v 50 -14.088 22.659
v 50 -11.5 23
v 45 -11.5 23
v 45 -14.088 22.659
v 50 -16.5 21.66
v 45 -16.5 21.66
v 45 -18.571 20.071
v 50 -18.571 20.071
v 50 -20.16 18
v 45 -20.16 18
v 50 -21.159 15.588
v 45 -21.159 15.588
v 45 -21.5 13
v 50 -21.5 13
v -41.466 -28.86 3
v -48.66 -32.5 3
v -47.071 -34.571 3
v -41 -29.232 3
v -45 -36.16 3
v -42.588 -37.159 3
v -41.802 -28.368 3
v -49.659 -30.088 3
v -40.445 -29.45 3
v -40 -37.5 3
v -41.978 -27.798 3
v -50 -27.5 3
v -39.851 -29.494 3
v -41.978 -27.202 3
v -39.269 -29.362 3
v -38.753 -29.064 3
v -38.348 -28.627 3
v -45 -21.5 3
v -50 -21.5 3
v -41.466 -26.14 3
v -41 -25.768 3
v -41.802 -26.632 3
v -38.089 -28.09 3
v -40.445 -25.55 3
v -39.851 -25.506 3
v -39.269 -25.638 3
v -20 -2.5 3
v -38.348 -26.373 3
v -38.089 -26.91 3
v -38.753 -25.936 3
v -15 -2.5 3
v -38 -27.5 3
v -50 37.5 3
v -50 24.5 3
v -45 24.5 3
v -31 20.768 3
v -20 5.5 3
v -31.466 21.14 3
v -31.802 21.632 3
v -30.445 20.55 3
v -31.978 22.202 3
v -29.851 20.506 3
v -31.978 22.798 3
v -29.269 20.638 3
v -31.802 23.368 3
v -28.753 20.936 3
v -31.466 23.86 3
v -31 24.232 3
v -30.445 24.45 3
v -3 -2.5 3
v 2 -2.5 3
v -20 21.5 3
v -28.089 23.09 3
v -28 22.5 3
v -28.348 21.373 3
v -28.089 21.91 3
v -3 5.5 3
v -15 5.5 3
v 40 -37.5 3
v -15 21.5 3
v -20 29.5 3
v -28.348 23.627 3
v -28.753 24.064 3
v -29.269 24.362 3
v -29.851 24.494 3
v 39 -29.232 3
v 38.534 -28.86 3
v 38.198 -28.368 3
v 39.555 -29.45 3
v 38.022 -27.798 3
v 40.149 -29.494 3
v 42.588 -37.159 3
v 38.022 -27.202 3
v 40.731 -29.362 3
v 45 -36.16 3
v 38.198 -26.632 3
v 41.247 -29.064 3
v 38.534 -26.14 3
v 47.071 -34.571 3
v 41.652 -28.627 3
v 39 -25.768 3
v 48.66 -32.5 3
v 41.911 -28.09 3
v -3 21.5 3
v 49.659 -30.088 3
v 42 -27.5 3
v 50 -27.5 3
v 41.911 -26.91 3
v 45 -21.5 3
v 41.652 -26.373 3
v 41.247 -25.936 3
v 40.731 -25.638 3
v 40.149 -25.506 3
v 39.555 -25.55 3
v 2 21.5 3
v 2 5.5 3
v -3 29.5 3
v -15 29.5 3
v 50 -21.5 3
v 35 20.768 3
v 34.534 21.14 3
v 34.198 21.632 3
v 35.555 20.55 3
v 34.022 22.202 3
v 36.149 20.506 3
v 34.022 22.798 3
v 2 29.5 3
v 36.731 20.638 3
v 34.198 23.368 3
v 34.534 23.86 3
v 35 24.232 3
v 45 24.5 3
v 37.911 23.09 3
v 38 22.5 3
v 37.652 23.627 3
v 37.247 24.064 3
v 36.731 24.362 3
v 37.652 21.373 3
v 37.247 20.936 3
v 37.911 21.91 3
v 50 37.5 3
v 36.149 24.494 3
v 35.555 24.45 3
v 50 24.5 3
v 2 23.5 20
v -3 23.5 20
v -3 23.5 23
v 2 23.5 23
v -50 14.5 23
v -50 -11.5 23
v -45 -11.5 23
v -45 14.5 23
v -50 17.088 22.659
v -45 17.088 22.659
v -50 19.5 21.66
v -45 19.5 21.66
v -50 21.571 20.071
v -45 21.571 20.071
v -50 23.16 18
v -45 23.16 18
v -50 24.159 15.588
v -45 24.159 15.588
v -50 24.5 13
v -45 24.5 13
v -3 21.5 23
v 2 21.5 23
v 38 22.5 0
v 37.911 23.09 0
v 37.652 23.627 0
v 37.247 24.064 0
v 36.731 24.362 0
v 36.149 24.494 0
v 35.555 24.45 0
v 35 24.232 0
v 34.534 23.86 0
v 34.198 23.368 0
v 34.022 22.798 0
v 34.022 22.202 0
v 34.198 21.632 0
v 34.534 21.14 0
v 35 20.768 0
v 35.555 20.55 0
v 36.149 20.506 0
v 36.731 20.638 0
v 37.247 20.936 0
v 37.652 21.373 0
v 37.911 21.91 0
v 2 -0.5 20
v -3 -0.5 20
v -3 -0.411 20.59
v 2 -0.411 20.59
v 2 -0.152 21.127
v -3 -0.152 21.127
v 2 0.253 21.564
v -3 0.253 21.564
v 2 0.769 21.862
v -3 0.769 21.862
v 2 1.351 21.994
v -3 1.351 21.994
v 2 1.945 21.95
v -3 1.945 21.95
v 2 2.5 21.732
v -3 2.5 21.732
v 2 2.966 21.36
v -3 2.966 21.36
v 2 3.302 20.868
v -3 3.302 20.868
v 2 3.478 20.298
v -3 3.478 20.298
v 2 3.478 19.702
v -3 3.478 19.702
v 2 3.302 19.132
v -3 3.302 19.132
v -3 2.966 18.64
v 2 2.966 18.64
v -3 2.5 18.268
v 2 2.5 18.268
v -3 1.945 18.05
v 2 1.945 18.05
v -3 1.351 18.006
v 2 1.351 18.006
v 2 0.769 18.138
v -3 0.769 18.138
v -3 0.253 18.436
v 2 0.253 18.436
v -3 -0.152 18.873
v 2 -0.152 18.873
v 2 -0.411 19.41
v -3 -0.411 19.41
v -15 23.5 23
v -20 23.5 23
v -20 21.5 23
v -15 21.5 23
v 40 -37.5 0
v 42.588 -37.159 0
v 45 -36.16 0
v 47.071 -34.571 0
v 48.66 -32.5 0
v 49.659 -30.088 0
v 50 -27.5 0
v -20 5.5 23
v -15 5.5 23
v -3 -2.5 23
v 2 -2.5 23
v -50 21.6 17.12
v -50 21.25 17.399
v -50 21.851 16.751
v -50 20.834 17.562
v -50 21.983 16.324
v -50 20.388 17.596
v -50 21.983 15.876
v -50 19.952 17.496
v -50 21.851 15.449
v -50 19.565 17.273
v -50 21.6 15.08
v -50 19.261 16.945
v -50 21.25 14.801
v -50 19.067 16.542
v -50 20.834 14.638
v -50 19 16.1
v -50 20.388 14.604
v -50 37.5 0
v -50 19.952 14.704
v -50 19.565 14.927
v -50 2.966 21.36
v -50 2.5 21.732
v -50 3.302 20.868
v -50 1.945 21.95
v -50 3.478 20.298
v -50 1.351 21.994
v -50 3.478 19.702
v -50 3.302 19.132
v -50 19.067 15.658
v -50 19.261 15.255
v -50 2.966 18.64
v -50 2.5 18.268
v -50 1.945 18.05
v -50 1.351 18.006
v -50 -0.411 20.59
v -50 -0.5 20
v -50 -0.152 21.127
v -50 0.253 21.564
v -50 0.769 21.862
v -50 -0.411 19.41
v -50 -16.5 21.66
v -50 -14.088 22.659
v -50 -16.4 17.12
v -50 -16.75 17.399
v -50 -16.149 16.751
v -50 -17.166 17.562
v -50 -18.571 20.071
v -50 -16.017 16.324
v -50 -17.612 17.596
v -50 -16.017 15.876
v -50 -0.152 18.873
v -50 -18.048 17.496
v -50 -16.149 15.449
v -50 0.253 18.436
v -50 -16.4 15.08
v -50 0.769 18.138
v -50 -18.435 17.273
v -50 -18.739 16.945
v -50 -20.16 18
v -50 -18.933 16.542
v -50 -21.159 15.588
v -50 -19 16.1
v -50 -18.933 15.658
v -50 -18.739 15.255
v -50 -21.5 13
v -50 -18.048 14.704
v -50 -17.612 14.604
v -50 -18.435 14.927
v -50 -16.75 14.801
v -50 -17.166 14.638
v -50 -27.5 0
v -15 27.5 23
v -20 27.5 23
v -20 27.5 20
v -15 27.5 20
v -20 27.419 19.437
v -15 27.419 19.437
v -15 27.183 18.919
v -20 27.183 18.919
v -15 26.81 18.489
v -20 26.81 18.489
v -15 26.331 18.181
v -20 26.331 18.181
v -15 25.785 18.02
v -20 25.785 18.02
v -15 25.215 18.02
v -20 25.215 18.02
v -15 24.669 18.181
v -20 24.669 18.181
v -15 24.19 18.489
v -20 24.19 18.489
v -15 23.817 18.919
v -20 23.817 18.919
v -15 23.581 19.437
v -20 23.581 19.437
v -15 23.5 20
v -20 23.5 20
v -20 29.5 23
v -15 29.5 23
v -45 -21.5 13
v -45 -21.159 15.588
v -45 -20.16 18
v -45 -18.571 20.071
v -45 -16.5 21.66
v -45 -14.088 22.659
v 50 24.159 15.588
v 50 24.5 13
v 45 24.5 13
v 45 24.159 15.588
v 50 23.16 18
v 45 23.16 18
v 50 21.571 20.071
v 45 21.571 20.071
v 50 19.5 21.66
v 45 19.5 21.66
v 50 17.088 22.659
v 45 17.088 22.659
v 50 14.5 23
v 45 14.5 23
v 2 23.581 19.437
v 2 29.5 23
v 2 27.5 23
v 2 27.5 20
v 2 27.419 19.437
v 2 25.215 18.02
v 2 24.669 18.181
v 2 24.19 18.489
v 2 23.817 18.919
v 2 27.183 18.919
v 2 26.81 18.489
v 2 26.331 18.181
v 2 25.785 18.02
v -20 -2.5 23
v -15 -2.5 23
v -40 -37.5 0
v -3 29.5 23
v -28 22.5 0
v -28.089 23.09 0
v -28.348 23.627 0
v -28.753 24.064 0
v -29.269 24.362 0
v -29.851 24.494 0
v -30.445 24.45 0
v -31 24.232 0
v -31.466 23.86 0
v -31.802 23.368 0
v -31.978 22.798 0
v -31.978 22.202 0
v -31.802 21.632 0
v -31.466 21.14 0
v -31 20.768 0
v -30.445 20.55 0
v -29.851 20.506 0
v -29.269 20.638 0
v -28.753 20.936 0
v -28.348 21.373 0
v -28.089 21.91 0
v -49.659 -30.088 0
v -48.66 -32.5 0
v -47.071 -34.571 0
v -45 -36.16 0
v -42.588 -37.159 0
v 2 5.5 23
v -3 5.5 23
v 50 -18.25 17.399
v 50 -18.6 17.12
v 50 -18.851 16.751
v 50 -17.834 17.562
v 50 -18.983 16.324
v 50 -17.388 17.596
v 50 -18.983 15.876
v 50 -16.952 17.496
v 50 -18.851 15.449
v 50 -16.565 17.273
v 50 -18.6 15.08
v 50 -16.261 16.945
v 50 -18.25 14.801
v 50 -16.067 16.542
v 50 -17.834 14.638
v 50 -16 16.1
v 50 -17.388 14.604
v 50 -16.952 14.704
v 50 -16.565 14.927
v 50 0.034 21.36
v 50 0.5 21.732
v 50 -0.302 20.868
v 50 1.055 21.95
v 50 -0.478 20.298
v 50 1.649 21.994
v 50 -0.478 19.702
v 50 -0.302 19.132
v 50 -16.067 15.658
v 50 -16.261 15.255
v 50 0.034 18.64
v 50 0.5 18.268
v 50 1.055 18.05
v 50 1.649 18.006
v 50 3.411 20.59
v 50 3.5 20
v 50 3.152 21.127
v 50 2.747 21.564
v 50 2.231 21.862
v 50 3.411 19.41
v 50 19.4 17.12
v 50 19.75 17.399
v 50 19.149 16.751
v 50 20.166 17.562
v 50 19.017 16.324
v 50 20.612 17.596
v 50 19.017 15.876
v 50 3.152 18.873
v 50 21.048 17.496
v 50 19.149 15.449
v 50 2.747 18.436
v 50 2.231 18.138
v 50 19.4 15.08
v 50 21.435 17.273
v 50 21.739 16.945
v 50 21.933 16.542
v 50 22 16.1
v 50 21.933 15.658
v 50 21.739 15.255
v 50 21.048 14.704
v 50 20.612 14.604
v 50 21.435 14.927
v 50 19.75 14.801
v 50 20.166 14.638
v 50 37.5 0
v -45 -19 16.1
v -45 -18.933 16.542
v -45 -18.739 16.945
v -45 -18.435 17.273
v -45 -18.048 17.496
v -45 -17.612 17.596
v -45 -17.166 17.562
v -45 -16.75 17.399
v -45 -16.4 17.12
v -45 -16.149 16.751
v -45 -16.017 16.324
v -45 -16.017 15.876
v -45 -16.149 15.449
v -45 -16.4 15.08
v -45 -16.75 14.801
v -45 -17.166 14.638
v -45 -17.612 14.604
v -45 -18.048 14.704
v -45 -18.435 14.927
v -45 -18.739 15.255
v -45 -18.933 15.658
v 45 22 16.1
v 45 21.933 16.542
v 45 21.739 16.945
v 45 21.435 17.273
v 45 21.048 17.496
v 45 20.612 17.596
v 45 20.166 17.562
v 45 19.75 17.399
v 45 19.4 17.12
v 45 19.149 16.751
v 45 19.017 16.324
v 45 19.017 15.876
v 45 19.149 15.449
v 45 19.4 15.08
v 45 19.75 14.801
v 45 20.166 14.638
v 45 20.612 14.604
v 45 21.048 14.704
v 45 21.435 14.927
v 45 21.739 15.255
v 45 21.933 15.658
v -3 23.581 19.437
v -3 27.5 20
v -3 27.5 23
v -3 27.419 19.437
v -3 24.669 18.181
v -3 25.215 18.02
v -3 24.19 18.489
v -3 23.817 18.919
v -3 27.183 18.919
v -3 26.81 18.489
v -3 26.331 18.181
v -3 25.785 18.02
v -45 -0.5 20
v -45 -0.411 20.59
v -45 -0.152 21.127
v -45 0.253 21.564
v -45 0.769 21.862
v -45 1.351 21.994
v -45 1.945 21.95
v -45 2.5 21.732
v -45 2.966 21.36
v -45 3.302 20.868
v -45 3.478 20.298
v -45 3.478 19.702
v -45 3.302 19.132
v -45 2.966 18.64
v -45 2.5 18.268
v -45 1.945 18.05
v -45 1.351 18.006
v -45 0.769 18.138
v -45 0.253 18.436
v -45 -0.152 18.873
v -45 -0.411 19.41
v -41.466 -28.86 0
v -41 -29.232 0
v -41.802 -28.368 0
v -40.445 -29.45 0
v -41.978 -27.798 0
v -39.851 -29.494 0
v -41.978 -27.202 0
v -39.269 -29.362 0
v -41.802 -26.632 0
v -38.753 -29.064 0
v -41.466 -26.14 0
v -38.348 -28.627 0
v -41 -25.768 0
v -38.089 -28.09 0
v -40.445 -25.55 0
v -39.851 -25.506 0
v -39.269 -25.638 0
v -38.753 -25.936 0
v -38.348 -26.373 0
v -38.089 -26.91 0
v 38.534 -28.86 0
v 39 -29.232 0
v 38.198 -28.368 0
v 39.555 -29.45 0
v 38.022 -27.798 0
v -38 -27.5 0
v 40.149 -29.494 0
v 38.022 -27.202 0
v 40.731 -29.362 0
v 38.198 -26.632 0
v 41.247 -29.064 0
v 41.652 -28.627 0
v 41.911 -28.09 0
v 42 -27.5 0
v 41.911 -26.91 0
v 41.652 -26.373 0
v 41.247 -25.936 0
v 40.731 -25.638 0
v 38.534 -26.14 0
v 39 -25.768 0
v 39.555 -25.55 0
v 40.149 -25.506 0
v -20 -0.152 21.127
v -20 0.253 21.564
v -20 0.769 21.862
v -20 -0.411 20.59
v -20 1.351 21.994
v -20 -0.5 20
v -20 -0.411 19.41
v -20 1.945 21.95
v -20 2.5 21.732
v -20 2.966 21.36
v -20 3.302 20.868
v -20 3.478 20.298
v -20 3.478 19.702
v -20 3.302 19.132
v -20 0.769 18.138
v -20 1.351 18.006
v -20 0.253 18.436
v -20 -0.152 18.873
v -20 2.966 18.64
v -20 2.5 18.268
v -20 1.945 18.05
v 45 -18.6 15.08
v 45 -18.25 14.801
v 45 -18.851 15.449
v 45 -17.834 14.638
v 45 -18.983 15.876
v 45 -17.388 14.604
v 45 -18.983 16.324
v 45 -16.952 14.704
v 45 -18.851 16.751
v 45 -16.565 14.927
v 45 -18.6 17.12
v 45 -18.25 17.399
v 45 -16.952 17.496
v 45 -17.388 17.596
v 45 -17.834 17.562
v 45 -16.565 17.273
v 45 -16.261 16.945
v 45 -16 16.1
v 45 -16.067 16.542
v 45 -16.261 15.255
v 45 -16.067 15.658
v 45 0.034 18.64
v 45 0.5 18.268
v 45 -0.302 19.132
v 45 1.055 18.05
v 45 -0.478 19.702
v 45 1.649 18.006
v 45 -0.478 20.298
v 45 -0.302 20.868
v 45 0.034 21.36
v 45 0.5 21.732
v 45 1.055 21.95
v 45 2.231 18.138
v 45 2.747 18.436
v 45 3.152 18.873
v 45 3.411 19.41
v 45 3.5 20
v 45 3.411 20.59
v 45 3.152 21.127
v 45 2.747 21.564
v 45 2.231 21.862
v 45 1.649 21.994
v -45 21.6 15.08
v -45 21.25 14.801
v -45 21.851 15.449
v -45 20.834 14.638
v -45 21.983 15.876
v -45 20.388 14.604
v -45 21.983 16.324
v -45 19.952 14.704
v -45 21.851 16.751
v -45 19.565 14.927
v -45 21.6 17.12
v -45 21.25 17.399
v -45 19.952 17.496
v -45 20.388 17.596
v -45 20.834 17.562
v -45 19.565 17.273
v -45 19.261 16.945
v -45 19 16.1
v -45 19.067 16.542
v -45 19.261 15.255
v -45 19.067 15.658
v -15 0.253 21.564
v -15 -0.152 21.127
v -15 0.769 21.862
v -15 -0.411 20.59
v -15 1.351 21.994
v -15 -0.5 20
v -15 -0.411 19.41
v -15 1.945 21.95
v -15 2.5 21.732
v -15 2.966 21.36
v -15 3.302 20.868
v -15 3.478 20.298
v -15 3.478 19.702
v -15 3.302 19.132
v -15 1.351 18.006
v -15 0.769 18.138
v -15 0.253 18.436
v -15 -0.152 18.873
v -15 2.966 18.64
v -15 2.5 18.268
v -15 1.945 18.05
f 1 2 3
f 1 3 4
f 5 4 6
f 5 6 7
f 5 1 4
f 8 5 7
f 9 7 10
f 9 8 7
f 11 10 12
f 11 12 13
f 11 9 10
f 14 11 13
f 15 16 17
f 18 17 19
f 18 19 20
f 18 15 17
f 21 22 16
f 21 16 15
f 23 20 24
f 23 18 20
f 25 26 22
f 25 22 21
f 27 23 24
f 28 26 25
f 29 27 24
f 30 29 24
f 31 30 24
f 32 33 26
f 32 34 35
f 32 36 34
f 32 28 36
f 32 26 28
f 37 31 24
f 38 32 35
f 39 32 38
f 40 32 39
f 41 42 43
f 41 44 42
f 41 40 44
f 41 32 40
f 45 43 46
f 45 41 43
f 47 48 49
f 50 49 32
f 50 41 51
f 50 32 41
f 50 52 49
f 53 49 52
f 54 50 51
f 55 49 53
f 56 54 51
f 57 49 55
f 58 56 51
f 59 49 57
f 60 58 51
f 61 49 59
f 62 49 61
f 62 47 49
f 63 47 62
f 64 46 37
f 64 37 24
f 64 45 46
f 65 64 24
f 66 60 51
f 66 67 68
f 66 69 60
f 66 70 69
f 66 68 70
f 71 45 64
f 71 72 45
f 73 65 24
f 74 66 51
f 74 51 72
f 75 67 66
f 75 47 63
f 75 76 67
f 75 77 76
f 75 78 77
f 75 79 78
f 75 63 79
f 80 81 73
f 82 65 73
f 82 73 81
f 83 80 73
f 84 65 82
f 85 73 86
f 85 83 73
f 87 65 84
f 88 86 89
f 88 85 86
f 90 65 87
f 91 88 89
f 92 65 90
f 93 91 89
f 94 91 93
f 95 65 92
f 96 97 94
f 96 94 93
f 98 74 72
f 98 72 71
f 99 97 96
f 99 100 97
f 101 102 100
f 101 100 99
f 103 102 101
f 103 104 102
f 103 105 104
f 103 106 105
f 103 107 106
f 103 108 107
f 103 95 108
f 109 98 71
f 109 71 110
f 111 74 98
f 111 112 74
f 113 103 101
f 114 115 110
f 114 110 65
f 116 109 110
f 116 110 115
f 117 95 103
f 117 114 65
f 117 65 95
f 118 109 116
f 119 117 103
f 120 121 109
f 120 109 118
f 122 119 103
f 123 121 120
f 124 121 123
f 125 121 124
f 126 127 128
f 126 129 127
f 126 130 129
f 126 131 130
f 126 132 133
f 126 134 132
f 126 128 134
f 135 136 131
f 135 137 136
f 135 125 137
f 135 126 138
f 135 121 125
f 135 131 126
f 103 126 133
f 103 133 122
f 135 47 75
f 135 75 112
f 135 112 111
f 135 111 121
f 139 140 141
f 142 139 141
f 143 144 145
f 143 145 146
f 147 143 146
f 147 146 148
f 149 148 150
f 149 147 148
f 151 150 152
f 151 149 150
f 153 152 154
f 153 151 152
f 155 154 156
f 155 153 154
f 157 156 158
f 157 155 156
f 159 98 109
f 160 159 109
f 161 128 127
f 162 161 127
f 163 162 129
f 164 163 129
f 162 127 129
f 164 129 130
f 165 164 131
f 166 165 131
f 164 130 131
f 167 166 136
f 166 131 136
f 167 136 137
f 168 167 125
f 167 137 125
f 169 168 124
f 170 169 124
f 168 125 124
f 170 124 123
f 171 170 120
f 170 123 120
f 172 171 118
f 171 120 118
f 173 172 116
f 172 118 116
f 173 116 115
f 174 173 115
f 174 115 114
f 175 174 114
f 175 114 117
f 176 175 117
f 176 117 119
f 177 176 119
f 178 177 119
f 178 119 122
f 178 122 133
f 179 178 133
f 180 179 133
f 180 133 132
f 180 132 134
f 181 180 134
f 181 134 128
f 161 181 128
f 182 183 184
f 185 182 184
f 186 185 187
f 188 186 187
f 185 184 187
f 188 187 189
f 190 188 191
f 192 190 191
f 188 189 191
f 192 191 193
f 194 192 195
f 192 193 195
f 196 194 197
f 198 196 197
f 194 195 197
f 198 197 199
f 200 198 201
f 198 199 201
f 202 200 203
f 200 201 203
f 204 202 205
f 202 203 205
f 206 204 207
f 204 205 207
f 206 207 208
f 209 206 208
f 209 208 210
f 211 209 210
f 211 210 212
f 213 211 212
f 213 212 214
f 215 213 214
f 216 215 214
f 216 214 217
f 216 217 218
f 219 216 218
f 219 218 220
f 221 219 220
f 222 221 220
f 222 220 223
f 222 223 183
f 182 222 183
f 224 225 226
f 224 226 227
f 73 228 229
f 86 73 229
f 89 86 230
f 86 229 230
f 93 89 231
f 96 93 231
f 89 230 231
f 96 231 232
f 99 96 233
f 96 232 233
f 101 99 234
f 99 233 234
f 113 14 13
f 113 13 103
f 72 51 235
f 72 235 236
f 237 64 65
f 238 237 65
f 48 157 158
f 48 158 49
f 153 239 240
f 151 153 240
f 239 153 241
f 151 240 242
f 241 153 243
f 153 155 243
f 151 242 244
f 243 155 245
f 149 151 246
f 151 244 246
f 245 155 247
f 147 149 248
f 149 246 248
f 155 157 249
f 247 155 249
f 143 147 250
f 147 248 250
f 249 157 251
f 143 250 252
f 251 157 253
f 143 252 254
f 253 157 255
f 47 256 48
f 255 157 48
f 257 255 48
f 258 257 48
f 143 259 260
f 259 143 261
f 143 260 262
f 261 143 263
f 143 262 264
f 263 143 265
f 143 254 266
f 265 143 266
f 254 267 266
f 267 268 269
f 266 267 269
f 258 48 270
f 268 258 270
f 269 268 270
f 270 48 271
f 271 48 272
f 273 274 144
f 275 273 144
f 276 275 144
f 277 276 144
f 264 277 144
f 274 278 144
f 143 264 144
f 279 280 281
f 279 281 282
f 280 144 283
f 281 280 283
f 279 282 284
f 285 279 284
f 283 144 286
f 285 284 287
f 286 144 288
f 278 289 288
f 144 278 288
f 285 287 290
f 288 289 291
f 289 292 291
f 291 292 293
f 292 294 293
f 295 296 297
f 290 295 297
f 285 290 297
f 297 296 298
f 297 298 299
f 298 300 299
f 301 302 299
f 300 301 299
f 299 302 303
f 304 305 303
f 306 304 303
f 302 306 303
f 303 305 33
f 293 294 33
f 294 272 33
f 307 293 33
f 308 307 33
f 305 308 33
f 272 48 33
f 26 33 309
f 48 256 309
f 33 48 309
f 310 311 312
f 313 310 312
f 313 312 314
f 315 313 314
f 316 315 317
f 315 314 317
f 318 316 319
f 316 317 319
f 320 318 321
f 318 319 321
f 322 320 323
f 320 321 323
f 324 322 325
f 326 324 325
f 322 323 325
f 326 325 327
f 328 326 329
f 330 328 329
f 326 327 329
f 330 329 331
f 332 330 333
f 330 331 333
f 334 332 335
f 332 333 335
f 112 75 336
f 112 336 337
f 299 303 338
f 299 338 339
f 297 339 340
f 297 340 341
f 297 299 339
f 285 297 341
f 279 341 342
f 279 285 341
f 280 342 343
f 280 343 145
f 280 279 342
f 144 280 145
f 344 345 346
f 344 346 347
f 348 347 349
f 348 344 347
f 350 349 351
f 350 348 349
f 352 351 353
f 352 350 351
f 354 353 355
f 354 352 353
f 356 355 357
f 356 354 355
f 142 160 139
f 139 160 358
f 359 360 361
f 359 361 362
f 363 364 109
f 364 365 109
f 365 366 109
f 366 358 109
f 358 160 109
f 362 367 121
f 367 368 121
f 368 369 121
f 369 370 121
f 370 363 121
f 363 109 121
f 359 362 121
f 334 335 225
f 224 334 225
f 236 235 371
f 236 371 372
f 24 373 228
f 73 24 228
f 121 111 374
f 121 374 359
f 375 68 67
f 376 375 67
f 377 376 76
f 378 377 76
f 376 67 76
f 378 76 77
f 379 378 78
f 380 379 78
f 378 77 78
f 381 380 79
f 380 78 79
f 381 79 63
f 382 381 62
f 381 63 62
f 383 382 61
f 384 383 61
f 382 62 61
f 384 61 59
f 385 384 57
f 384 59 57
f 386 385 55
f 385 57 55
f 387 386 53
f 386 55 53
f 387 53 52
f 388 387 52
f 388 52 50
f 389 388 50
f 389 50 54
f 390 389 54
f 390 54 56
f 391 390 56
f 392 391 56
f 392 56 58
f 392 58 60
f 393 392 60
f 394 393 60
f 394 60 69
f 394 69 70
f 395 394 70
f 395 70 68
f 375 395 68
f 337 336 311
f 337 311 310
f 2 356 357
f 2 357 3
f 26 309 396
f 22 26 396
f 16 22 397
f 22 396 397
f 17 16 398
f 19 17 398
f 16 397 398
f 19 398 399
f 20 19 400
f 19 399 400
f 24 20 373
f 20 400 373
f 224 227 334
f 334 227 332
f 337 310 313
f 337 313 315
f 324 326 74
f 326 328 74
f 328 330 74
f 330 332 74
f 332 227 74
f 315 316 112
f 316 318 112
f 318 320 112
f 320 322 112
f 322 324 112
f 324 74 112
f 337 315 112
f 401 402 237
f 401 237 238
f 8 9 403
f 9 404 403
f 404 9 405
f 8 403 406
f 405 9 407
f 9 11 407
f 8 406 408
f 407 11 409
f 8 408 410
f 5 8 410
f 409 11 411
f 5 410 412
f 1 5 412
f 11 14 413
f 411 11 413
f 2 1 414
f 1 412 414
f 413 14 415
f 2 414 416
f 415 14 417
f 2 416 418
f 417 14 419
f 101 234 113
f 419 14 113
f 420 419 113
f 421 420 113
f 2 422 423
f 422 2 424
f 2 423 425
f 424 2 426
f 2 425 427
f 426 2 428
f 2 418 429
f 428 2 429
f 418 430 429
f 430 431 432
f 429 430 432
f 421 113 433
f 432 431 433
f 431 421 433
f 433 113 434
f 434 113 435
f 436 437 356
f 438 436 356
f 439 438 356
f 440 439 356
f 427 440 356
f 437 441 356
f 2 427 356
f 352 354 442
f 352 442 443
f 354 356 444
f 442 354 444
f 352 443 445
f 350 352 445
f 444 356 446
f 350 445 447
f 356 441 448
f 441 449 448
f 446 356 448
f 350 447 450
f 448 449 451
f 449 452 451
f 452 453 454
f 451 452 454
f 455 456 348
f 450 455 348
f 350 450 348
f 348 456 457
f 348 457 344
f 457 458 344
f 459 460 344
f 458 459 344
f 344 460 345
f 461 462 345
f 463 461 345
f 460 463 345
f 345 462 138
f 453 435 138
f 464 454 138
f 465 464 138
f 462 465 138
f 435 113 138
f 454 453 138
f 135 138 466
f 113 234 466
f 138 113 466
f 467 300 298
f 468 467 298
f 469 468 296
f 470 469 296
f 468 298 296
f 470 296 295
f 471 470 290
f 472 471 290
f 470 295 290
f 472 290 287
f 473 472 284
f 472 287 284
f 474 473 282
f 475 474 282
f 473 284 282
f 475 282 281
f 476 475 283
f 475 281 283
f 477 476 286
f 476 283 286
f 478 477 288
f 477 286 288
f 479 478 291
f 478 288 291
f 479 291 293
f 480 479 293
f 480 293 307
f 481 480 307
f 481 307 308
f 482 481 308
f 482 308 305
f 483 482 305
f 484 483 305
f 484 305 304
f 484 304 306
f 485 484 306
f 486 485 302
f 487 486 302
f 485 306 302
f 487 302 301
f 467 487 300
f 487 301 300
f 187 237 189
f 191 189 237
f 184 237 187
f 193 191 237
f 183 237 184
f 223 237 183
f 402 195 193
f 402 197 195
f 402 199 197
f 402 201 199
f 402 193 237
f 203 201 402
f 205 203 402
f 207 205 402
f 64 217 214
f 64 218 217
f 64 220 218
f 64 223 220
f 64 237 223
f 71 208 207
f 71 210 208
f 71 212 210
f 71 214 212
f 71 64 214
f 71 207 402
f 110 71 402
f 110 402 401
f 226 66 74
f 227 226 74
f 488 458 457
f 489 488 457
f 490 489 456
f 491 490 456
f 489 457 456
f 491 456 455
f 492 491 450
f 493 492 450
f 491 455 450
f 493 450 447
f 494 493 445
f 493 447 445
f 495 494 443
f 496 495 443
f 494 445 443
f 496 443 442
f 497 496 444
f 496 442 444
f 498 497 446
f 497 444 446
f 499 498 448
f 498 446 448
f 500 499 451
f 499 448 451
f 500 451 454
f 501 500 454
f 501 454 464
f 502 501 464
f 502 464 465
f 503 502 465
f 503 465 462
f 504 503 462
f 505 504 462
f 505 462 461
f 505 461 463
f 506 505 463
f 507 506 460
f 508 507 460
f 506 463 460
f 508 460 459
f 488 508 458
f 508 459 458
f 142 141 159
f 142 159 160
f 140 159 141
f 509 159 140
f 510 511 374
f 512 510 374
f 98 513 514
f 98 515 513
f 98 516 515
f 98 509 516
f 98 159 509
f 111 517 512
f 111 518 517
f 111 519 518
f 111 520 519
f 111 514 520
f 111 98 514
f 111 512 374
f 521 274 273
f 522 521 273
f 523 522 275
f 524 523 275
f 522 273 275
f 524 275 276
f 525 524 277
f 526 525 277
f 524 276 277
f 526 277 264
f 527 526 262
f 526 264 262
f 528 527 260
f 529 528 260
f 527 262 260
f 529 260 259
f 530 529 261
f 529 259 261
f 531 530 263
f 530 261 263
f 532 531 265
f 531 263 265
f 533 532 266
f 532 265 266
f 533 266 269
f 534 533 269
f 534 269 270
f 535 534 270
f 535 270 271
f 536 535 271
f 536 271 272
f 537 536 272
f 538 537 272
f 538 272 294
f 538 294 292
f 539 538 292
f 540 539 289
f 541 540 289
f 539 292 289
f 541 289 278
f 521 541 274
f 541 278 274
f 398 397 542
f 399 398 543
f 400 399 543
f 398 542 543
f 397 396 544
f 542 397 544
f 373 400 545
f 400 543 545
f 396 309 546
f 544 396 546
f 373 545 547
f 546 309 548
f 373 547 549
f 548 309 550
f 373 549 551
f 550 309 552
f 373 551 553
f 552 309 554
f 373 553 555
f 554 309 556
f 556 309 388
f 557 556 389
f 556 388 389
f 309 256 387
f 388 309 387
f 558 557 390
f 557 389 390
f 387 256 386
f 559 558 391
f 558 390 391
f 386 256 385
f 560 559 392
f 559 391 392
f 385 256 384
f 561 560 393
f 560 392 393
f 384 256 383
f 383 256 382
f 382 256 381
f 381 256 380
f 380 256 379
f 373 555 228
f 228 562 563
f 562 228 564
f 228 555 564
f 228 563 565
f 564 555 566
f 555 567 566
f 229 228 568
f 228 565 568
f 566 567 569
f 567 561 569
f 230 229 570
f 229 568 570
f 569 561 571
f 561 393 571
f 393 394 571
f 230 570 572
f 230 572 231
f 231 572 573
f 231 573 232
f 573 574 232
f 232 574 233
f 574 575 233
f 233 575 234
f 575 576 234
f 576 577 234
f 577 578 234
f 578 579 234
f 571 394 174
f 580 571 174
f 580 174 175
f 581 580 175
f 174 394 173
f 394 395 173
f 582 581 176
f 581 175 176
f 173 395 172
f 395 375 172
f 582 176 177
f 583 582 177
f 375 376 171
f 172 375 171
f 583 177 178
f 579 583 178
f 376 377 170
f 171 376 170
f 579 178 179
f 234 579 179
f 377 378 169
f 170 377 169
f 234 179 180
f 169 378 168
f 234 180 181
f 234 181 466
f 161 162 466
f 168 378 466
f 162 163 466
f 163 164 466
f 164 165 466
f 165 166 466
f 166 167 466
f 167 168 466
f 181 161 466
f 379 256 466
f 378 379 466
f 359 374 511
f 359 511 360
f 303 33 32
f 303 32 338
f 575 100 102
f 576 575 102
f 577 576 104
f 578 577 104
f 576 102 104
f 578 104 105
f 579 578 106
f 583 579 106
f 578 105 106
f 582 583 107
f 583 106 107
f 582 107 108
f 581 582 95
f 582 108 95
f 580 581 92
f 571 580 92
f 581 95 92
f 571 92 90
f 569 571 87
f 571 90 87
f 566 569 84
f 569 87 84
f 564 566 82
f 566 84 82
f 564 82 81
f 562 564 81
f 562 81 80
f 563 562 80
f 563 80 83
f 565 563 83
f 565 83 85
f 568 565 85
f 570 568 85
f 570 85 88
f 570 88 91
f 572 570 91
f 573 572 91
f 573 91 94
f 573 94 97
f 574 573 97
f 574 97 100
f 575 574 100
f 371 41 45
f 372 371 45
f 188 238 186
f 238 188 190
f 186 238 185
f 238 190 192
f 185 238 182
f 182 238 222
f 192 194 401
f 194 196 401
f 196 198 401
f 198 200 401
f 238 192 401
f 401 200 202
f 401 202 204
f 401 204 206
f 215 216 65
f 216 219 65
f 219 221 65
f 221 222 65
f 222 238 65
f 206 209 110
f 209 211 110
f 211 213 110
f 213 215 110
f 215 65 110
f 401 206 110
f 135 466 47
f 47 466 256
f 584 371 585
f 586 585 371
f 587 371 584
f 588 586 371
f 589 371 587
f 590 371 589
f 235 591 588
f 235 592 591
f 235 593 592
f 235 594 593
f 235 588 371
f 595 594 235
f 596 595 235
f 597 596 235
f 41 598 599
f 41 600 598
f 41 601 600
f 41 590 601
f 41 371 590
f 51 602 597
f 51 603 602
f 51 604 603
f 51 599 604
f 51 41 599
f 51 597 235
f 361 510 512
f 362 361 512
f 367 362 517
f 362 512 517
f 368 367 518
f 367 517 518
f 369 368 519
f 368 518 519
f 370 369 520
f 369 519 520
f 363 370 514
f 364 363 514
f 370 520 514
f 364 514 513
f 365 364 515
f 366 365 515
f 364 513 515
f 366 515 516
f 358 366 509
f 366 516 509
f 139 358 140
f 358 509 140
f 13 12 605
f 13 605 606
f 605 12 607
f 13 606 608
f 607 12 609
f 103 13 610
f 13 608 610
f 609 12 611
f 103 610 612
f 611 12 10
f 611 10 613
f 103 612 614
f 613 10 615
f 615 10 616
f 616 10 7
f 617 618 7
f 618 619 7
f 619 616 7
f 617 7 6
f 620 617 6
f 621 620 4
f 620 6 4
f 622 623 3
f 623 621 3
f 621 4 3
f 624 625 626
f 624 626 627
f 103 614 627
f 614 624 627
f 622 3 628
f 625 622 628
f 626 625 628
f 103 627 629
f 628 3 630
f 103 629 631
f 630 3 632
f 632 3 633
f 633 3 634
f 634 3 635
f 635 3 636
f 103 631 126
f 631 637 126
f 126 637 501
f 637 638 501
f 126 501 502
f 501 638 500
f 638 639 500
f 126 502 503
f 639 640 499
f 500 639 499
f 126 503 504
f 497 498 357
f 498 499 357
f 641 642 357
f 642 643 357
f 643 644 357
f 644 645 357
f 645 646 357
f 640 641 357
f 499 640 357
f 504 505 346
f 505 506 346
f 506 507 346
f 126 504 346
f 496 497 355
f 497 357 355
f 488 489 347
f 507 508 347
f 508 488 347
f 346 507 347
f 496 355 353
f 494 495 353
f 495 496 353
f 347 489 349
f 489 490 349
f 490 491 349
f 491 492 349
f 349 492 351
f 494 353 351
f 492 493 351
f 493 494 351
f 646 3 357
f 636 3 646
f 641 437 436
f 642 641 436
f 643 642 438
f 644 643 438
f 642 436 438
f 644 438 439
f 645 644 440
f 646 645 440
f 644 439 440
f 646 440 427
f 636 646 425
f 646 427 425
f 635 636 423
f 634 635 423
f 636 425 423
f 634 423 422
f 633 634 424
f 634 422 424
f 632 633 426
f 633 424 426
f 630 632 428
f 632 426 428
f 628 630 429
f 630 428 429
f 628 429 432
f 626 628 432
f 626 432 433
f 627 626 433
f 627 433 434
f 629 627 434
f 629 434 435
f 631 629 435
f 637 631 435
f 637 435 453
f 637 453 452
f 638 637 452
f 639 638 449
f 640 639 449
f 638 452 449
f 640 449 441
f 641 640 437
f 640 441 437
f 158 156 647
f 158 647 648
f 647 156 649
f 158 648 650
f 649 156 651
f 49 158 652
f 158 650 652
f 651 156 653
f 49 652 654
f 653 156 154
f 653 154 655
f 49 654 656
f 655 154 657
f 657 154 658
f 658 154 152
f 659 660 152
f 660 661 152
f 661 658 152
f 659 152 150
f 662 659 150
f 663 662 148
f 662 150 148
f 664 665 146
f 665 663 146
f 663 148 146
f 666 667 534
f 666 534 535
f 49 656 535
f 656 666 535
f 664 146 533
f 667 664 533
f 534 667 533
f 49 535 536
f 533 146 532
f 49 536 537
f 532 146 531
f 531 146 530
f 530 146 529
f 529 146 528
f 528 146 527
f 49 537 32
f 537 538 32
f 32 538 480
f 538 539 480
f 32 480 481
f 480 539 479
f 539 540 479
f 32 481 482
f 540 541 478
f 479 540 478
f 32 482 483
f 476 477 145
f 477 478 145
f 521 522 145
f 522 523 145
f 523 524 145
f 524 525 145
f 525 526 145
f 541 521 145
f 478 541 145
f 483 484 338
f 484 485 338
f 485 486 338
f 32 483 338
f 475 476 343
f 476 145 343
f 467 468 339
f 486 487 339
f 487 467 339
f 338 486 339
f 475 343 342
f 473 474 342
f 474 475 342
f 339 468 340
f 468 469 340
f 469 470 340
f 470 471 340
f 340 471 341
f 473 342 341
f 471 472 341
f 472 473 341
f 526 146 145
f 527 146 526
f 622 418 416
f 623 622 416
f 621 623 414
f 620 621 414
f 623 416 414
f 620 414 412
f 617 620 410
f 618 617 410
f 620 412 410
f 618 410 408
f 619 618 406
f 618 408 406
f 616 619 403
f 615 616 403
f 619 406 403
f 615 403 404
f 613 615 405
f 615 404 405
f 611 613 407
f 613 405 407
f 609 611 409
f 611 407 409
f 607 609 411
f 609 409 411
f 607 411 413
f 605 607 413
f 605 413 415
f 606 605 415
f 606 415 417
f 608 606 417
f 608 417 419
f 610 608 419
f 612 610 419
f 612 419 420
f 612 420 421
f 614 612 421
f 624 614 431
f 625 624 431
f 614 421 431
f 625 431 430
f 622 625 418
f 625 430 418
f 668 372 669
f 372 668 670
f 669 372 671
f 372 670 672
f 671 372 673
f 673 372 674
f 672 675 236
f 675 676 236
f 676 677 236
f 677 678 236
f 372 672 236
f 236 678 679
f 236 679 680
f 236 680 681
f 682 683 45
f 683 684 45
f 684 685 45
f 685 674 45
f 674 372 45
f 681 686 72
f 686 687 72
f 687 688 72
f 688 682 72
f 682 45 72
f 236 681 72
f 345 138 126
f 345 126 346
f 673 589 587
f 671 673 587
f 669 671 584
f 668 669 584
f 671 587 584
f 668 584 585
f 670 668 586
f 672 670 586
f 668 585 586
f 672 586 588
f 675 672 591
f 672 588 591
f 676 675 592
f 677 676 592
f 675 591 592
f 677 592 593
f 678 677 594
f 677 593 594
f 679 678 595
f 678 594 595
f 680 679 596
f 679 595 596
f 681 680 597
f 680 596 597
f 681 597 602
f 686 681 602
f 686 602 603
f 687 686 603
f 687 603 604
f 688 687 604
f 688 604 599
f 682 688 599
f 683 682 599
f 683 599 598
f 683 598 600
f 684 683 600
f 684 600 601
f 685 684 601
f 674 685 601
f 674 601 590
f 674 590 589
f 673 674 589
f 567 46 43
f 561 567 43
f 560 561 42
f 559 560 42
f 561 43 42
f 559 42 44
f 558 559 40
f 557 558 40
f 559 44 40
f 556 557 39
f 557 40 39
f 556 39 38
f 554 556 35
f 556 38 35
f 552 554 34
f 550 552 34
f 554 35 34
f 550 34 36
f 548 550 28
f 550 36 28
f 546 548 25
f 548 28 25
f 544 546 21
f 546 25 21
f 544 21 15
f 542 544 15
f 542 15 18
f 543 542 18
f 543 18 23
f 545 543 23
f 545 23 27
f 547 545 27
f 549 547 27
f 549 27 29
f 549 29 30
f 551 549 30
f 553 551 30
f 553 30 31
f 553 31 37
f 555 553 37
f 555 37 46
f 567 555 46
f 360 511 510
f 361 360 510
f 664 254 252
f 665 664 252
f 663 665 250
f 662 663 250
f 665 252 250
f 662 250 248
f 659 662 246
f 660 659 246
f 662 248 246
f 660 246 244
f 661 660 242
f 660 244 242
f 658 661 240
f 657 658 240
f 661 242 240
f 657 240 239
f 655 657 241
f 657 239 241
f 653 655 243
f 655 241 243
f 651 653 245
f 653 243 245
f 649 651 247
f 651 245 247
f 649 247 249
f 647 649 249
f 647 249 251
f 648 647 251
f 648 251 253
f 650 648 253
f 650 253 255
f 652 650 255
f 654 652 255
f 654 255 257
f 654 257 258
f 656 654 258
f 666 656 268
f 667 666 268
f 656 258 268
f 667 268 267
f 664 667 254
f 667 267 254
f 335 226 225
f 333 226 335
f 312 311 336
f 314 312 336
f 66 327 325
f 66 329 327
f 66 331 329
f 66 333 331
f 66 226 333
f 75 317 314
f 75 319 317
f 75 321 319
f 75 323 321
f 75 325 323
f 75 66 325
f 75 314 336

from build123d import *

# Parameters (mm, degrees)
F1_DEPTH  = 3
F2_R      = 1.5
F2_R_2    = 2
F3_DEPTH  = 5
F4_R      = 1.5
F4_R_2    = 2
F5_DEPTH  = 5
F6_R      = 2
F7_DEPTH  = 25.4
F8_W      = 5
F8_H      = 8
F9_DEPTH  = 20
F10_R     = 2
F11_DEPTH = 25.4
F13_DEPTH = 25.4


with BuildPart() as f1:
    # F0 (on Top) → F1 (new body)
    with BuildSketch(Plane.XY):
        with BuildLine():
            Line((50, -27.5), (50, 37.5))
            Line((50, 37.5), (-50, 37.5))
            Line((-50, 37.5), (-50, -27.5))
            ThreePointArc((-50, -27.5), (-47.071068, -34.571068), (-40, -37.5))
            Line((-40, -37.5), (40, -37.5))
            ThreePointArc((40, -37.5), (47.071068, -34.571068), (50, -27.5))
        make_face()
    extrude(amount=F1_DEPTH)

    # F2 (on face) → F3 (join)
    with BuildSketch(Plane.YZ.offset(50)):
        with BuildLine():
            Line((-21.5, 13), (-21.5, 3))
            Line((-21.5, 3), (24.5, 3))
            Line((24.5, 3), (24.5, 13))
            ThreePointArc((24.5, 13), (21.571068, 20.071068), (14.5, 23))
            Line((14.5, 23), (-11.5, 23))
            ThreePointArc((-11.5, 23), (-18.571068, 20.071068), (-21.5, 13))
        make_face()
        with Locations((-17.5, 16.1)):
            Circle(F2_R, mode=Mode.SUBTRACT)
        with Locations((20.5, 16.1)):
            Circle(F2_R, mode=Mode.SUBTRACT)
        with Locations((1.5, 20)):
            Circle(F2_R_2, mode=Mode.SUBTRACT)
    extrude(amount=-F3_DEPTH)

    # F4 (on face) → F5 (join)
    with BuildSketch(Plane(origin=(-50, 0, 0), x_dir=(0, -1, 0), z_dir=(-1, 0, 0))):
        with BuildLine():
            ThreePointArc((21.5, 13), (18.571068, 20.071068), (11.5, 23))
            Line((11.5, 23), (-14.5, 23))
            ThreePointArc((-14.5, 23), (-21.571068, 20.071068), (-24.5, 13))
            Line((-24.5, 13), (-24.5, 3))
            Line((-24.5, 3), (21.5, 3))
            Line((21.5, 3), (21.5, 13))
        make_face()
        with Locations((-20.5, 16.1)):
            Circle(F4_R, mode=Mode.SUBTRACT)
        with Locations((17.5, 16.1)):
            Circle(F4_R, mode=Mode.SUBTRACT)
        with Locations((-1.5, 20)):
            Circle(F4_R_2, mode=Mode.SUBTRACT)
    extrude(amount=-F5_DEPTH)

    # F6 (on face) → F7 (cut)
    with BuildSketch(Plane.XY.offset(3)):
        with Locations((-30, 22.5)):
            Circle(F6_R)
        with Locations((-40, -27.5)):
            Circle(F6_R)
        with Locations((40, -27.5)):
            Circle(F6_R)
        with Locations((36, 22.5)):
            Circle(F6_R)
    extrude(amount=-F7_DEPTH, mode=Mode.SUBTRACT)

    # F8 (on face) → F9 (join)
    with BuildSketch(Plane.XY.offset(3)):
        with Locations((-17.5, 25.5)):
            Rectangle(F8_W, F8_H)
        with Locations((-0.5, 25.5)):
            Rectangle(F8_W, F8_H)
        with Locations((-17.5, 1.5)):
            Rectangle(F8_W, F8_H)
        with Locations((-0.5, 1.5)):
            Rectangle(F8_W, F8_H)
    extrude(amount=F9_DEPTH)

    # F10 (on face) → F11 (cut)
    with BuildSketch(Plane(origin=(-20, 0, 0), x_dir=(0, -1, 0), z_dir=(-1, 0, 0))):
        with Locations((-1.5, 20)):
            Circle(F10_R)
    extrude(amount=-F11_DEPTH, mode=Mode.SUBTRACT)

    # F12 (on face) → F13 (cut)
    with BuildSketch(Plane(origin=(-20, 0, 0), x_dir=(0, -1, 0), z_dir=(-1, 0, 0))):
        with BuildLine():
            Line((-27.5, 23), (-27.5, 20))
            ThreePointArc((-27.5, 20), (-25.5, 18), (-23.5, 20))
            Line((-23.5, 20), (-23.5, 23))
            Line((-23.5, 23), (-27.5, 23))
        make_face()
    extrude(amount=-F13_DEPTH, mode=Mode.SUBTRACT)


solid = f1.part
